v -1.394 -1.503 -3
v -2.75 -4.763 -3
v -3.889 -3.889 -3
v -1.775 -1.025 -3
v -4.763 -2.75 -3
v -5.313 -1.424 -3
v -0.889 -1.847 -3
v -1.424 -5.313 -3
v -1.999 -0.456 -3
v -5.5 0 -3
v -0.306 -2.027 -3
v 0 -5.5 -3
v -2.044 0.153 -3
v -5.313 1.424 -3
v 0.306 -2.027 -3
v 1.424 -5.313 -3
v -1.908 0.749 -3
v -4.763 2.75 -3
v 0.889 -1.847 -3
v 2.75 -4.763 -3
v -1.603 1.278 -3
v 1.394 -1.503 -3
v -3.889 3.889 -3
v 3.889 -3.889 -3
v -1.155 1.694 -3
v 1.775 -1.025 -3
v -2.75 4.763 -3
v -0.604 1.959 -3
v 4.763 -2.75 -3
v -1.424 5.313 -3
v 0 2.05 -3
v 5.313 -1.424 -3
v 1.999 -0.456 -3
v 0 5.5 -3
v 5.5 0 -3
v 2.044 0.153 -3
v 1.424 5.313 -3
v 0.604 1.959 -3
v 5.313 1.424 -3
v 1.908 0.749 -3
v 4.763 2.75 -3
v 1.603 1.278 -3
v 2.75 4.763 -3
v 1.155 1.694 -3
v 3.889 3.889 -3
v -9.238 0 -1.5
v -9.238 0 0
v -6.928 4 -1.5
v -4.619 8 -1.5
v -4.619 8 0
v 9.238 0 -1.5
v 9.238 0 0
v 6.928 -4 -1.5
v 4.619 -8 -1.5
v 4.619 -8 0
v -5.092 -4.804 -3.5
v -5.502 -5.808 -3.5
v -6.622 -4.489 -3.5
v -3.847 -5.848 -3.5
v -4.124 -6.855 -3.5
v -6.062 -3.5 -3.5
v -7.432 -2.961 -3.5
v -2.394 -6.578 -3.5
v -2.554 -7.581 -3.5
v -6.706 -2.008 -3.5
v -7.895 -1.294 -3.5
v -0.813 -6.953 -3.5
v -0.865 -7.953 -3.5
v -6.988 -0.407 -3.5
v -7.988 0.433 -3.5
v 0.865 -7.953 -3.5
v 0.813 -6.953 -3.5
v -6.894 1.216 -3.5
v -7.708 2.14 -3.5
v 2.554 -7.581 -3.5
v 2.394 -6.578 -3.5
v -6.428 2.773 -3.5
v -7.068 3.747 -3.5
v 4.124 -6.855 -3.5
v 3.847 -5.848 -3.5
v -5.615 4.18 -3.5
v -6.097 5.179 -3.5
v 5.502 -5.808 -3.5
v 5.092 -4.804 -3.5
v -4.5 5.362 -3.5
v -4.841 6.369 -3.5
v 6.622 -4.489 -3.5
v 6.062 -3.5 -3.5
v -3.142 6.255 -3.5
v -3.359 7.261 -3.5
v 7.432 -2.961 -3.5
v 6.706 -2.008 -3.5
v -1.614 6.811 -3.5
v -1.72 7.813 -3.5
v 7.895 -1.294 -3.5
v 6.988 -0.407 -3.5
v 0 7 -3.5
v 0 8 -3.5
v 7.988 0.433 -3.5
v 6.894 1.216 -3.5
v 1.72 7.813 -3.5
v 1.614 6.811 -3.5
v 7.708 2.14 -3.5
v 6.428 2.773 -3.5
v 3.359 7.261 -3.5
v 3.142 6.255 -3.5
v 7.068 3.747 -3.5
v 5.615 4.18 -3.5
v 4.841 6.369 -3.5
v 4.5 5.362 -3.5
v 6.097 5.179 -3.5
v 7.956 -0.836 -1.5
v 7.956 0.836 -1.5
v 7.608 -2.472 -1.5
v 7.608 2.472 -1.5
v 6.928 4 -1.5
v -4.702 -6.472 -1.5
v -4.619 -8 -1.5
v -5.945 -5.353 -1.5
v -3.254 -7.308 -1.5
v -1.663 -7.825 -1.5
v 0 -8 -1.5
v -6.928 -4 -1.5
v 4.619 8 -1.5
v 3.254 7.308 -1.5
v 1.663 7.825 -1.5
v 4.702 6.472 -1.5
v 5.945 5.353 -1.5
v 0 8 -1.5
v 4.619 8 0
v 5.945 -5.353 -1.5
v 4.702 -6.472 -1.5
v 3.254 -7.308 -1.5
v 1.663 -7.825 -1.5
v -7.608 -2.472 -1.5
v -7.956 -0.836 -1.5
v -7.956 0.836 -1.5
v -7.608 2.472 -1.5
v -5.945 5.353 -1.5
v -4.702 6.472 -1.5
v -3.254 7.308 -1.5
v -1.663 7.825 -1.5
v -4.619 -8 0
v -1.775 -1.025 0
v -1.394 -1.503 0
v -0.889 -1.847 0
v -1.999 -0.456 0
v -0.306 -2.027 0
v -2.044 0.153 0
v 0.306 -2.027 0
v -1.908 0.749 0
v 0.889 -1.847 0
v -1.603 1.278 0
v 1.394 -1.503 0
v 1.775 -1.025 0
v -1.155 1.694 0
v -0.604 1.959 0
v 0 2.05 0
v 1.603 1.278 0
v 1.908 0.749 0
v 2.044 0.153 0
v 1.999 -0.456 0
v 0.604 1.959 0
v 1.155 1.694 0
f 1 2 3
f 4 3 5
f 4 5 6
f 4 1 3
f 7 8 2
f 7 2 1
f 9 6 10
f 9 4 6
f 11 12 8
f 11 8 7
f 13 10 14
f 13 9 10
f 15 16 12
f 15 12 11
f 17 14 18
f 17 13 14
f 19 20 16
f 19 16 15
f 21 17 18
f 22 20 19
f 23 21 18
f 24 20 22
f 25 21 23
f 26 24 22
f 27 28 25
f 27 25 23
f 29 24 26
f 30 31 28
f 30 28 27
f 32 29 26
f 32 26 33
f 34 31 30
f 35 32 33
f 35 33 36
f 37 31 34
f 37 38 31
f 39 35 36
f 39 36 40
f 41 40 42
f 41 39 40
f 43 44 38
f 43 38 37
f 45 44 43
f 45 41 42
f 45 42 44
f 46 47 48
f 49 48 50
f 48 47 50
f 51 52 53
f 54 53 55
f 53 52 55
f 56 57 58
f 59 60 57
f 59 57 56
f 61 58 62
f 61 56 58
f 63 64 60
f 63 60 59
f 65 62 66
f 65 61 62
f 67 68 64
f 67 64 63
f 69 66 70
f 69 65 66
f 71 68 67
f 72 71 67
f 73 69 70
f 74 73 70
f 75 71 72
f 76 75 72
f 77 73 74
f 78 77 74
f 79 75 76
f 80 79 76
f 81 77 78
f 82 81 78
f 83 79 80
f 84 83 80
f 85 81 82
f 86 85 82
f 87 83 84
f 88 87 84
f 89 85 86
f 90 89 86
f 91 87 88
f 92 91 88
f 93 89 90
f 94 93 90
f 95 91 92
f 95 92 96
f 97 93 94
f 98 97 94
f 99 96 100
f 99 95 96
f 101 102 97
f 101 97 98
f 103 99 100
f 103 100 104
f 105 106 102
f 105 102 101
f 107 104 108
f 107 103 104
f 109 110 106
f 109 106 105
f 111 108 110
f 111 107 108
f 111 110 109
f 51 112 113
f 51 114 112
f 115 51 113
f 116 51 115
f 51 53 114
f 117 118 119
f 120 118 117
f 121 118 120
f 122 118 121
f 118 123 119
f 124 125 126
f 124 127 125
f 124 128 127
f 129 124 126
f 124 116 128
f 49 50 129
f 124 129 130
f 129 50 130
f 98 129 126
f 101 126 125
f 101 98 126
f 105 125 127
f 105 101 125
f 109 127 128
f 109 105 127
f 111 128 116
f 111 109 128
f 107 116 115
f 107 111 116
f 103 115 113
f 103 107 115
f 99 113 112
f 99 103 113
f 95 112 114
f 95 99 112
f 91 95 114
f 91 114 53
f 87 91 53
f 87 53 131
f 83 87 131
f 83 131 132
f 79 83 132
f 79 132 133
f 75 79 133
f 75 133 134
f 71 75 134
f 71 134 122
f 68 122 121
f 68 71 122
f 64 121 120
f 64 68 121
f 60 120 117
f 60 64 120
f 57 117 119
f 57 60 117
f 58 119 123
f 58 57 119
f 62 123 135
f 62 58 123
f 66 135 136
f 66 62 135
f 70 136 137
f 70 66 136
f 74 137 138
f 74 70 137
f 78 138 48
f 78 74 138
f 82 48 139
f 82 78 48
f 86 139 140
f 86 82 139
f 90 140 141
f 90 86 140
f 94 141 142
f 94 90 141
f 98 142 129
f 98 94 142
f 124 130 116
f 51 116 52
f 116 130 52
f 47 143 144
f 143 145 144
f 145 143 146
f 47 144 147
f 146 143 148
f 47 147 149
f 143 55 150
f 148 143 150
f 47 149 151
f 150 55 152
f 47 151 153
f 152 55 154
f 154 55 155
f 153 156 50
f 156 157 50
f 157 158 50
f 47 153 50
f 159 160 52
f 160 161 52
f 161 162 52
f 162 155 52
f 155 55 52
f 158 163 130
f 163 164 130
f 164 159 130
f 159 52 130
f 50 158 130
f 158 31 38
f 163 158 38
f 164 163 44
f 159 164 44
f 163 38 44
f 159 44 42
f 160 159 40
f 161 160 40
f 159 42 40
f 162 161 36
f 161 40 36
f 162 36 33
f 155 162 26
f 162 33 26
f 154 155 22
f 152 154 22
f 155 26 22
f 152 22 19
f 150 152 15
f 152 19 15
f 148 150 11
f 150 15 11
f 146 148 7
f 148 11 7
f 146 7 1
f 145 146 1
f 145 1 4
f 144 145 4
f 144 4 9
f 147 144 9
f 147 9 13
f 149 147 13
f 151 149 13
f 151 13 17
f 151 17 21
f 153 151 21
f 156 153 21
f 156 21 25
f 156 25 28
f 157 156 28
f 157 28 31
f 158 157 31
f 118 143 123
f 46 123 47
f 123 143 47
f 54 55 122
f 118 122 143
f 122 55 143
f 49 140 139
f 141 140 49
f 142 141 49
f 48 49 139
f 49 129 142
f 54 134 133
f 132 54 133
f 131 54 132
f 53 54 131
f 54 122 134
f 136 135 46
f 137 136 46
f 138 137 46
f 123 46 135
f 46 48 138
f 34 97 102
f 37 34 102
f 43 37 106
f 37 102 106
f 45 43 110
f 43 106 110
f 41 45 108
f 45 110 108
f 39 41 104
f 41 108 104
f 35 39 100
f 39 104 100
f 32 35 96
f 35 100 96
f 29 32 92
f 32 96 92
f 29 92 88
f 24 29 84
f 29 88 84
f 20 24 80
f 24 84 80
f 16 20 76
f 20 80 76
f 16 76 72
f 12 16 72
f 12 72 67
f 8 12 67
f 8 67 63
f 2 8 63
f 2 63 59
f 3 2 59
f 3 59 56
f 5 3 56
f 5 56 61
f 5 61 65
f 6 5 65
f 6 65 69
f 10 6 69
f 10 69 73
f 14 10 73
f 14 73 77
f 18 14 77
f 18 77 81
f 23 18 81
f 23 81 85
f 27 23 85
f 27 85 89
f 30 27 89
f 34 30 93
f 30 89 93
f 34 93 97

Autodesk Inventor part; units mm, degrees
ref_plane "YZ Plane" through (0, 0, 0) normal (1, 0, 0) x (0, 1, 0)
ref_plane "XZ Plane" through (0, 0, 0) normal (0, 1, 0) x (-1, 0, 0)
ref_plane "XY Plane" through (0, 0, 0) normal (0, 0, 1) x (1, 0, 0)
sketch "Esquisse1" plane through (0, 0, 0) normal (1, 0, 0) x (0, 1, 0)
  line L0 (0, 0) -> (0, -6.3939)
  line L1 (9.5, 0) -> (2.05, 0)
  line L2 (9.5, 0) -> (9.5, -1.5)
  line L3 (9.5, -1.5) -> (8, -1.5)
  line L4 (8, -1.5) -> (8, -3.5)
  line L5 (8, -3.5) -> (7, -3.5)
  line L6 (2.05, 0) -> (2.05, -3)
  line L7 (7, -3.5) -> (5.5, -3)
  line L8 (5.5, -3) -> (2.05, -3)
  dimension "d1" = 1.5
  dimension "d2" = 1.5
  dimension "d4" = 16
  dimension "d5" = 4.1
  dimension "d10" = 2
  dimension "d11" = 3
  dimension "d12" = 1.5
  dimension "d13" = 1
revolve "Révolution1" add sketch "Esquisse1" angle 360 about axis through (0, 0, 0) along (0, 0, -1)
sketch "Esquisse2" plane through (0, 0, 0) normal (0, 0, 1) x (1, 0, 0)
  line L0 (4.6188, 8) -> (9.2376, 0)
  line L1 (9.2376, 0) -> (4.6188, -8)
  line L2 (4.6188, -8) -> (-4.6188, -8)
  line L3 (-4.6188, -8) -> (-9.2376, 0)
  line L4 (-9.2376, 0) -> (-4.6188, 8)
  line L5 (-4.6188, 8) -> (4.6188, 8)
  circle A0 centre (0, 0) radius 9.5 projected
  dimension "d7" = 16
extrude "Extrusion1" cut sketch "Esquisse2" against normal up to surface (1.5 mm away)
thread "Filetage1" size "M16x1" class "6g" standard "ISO Metric profile" full length
properties part number "cartridge_locker_piston_top"
